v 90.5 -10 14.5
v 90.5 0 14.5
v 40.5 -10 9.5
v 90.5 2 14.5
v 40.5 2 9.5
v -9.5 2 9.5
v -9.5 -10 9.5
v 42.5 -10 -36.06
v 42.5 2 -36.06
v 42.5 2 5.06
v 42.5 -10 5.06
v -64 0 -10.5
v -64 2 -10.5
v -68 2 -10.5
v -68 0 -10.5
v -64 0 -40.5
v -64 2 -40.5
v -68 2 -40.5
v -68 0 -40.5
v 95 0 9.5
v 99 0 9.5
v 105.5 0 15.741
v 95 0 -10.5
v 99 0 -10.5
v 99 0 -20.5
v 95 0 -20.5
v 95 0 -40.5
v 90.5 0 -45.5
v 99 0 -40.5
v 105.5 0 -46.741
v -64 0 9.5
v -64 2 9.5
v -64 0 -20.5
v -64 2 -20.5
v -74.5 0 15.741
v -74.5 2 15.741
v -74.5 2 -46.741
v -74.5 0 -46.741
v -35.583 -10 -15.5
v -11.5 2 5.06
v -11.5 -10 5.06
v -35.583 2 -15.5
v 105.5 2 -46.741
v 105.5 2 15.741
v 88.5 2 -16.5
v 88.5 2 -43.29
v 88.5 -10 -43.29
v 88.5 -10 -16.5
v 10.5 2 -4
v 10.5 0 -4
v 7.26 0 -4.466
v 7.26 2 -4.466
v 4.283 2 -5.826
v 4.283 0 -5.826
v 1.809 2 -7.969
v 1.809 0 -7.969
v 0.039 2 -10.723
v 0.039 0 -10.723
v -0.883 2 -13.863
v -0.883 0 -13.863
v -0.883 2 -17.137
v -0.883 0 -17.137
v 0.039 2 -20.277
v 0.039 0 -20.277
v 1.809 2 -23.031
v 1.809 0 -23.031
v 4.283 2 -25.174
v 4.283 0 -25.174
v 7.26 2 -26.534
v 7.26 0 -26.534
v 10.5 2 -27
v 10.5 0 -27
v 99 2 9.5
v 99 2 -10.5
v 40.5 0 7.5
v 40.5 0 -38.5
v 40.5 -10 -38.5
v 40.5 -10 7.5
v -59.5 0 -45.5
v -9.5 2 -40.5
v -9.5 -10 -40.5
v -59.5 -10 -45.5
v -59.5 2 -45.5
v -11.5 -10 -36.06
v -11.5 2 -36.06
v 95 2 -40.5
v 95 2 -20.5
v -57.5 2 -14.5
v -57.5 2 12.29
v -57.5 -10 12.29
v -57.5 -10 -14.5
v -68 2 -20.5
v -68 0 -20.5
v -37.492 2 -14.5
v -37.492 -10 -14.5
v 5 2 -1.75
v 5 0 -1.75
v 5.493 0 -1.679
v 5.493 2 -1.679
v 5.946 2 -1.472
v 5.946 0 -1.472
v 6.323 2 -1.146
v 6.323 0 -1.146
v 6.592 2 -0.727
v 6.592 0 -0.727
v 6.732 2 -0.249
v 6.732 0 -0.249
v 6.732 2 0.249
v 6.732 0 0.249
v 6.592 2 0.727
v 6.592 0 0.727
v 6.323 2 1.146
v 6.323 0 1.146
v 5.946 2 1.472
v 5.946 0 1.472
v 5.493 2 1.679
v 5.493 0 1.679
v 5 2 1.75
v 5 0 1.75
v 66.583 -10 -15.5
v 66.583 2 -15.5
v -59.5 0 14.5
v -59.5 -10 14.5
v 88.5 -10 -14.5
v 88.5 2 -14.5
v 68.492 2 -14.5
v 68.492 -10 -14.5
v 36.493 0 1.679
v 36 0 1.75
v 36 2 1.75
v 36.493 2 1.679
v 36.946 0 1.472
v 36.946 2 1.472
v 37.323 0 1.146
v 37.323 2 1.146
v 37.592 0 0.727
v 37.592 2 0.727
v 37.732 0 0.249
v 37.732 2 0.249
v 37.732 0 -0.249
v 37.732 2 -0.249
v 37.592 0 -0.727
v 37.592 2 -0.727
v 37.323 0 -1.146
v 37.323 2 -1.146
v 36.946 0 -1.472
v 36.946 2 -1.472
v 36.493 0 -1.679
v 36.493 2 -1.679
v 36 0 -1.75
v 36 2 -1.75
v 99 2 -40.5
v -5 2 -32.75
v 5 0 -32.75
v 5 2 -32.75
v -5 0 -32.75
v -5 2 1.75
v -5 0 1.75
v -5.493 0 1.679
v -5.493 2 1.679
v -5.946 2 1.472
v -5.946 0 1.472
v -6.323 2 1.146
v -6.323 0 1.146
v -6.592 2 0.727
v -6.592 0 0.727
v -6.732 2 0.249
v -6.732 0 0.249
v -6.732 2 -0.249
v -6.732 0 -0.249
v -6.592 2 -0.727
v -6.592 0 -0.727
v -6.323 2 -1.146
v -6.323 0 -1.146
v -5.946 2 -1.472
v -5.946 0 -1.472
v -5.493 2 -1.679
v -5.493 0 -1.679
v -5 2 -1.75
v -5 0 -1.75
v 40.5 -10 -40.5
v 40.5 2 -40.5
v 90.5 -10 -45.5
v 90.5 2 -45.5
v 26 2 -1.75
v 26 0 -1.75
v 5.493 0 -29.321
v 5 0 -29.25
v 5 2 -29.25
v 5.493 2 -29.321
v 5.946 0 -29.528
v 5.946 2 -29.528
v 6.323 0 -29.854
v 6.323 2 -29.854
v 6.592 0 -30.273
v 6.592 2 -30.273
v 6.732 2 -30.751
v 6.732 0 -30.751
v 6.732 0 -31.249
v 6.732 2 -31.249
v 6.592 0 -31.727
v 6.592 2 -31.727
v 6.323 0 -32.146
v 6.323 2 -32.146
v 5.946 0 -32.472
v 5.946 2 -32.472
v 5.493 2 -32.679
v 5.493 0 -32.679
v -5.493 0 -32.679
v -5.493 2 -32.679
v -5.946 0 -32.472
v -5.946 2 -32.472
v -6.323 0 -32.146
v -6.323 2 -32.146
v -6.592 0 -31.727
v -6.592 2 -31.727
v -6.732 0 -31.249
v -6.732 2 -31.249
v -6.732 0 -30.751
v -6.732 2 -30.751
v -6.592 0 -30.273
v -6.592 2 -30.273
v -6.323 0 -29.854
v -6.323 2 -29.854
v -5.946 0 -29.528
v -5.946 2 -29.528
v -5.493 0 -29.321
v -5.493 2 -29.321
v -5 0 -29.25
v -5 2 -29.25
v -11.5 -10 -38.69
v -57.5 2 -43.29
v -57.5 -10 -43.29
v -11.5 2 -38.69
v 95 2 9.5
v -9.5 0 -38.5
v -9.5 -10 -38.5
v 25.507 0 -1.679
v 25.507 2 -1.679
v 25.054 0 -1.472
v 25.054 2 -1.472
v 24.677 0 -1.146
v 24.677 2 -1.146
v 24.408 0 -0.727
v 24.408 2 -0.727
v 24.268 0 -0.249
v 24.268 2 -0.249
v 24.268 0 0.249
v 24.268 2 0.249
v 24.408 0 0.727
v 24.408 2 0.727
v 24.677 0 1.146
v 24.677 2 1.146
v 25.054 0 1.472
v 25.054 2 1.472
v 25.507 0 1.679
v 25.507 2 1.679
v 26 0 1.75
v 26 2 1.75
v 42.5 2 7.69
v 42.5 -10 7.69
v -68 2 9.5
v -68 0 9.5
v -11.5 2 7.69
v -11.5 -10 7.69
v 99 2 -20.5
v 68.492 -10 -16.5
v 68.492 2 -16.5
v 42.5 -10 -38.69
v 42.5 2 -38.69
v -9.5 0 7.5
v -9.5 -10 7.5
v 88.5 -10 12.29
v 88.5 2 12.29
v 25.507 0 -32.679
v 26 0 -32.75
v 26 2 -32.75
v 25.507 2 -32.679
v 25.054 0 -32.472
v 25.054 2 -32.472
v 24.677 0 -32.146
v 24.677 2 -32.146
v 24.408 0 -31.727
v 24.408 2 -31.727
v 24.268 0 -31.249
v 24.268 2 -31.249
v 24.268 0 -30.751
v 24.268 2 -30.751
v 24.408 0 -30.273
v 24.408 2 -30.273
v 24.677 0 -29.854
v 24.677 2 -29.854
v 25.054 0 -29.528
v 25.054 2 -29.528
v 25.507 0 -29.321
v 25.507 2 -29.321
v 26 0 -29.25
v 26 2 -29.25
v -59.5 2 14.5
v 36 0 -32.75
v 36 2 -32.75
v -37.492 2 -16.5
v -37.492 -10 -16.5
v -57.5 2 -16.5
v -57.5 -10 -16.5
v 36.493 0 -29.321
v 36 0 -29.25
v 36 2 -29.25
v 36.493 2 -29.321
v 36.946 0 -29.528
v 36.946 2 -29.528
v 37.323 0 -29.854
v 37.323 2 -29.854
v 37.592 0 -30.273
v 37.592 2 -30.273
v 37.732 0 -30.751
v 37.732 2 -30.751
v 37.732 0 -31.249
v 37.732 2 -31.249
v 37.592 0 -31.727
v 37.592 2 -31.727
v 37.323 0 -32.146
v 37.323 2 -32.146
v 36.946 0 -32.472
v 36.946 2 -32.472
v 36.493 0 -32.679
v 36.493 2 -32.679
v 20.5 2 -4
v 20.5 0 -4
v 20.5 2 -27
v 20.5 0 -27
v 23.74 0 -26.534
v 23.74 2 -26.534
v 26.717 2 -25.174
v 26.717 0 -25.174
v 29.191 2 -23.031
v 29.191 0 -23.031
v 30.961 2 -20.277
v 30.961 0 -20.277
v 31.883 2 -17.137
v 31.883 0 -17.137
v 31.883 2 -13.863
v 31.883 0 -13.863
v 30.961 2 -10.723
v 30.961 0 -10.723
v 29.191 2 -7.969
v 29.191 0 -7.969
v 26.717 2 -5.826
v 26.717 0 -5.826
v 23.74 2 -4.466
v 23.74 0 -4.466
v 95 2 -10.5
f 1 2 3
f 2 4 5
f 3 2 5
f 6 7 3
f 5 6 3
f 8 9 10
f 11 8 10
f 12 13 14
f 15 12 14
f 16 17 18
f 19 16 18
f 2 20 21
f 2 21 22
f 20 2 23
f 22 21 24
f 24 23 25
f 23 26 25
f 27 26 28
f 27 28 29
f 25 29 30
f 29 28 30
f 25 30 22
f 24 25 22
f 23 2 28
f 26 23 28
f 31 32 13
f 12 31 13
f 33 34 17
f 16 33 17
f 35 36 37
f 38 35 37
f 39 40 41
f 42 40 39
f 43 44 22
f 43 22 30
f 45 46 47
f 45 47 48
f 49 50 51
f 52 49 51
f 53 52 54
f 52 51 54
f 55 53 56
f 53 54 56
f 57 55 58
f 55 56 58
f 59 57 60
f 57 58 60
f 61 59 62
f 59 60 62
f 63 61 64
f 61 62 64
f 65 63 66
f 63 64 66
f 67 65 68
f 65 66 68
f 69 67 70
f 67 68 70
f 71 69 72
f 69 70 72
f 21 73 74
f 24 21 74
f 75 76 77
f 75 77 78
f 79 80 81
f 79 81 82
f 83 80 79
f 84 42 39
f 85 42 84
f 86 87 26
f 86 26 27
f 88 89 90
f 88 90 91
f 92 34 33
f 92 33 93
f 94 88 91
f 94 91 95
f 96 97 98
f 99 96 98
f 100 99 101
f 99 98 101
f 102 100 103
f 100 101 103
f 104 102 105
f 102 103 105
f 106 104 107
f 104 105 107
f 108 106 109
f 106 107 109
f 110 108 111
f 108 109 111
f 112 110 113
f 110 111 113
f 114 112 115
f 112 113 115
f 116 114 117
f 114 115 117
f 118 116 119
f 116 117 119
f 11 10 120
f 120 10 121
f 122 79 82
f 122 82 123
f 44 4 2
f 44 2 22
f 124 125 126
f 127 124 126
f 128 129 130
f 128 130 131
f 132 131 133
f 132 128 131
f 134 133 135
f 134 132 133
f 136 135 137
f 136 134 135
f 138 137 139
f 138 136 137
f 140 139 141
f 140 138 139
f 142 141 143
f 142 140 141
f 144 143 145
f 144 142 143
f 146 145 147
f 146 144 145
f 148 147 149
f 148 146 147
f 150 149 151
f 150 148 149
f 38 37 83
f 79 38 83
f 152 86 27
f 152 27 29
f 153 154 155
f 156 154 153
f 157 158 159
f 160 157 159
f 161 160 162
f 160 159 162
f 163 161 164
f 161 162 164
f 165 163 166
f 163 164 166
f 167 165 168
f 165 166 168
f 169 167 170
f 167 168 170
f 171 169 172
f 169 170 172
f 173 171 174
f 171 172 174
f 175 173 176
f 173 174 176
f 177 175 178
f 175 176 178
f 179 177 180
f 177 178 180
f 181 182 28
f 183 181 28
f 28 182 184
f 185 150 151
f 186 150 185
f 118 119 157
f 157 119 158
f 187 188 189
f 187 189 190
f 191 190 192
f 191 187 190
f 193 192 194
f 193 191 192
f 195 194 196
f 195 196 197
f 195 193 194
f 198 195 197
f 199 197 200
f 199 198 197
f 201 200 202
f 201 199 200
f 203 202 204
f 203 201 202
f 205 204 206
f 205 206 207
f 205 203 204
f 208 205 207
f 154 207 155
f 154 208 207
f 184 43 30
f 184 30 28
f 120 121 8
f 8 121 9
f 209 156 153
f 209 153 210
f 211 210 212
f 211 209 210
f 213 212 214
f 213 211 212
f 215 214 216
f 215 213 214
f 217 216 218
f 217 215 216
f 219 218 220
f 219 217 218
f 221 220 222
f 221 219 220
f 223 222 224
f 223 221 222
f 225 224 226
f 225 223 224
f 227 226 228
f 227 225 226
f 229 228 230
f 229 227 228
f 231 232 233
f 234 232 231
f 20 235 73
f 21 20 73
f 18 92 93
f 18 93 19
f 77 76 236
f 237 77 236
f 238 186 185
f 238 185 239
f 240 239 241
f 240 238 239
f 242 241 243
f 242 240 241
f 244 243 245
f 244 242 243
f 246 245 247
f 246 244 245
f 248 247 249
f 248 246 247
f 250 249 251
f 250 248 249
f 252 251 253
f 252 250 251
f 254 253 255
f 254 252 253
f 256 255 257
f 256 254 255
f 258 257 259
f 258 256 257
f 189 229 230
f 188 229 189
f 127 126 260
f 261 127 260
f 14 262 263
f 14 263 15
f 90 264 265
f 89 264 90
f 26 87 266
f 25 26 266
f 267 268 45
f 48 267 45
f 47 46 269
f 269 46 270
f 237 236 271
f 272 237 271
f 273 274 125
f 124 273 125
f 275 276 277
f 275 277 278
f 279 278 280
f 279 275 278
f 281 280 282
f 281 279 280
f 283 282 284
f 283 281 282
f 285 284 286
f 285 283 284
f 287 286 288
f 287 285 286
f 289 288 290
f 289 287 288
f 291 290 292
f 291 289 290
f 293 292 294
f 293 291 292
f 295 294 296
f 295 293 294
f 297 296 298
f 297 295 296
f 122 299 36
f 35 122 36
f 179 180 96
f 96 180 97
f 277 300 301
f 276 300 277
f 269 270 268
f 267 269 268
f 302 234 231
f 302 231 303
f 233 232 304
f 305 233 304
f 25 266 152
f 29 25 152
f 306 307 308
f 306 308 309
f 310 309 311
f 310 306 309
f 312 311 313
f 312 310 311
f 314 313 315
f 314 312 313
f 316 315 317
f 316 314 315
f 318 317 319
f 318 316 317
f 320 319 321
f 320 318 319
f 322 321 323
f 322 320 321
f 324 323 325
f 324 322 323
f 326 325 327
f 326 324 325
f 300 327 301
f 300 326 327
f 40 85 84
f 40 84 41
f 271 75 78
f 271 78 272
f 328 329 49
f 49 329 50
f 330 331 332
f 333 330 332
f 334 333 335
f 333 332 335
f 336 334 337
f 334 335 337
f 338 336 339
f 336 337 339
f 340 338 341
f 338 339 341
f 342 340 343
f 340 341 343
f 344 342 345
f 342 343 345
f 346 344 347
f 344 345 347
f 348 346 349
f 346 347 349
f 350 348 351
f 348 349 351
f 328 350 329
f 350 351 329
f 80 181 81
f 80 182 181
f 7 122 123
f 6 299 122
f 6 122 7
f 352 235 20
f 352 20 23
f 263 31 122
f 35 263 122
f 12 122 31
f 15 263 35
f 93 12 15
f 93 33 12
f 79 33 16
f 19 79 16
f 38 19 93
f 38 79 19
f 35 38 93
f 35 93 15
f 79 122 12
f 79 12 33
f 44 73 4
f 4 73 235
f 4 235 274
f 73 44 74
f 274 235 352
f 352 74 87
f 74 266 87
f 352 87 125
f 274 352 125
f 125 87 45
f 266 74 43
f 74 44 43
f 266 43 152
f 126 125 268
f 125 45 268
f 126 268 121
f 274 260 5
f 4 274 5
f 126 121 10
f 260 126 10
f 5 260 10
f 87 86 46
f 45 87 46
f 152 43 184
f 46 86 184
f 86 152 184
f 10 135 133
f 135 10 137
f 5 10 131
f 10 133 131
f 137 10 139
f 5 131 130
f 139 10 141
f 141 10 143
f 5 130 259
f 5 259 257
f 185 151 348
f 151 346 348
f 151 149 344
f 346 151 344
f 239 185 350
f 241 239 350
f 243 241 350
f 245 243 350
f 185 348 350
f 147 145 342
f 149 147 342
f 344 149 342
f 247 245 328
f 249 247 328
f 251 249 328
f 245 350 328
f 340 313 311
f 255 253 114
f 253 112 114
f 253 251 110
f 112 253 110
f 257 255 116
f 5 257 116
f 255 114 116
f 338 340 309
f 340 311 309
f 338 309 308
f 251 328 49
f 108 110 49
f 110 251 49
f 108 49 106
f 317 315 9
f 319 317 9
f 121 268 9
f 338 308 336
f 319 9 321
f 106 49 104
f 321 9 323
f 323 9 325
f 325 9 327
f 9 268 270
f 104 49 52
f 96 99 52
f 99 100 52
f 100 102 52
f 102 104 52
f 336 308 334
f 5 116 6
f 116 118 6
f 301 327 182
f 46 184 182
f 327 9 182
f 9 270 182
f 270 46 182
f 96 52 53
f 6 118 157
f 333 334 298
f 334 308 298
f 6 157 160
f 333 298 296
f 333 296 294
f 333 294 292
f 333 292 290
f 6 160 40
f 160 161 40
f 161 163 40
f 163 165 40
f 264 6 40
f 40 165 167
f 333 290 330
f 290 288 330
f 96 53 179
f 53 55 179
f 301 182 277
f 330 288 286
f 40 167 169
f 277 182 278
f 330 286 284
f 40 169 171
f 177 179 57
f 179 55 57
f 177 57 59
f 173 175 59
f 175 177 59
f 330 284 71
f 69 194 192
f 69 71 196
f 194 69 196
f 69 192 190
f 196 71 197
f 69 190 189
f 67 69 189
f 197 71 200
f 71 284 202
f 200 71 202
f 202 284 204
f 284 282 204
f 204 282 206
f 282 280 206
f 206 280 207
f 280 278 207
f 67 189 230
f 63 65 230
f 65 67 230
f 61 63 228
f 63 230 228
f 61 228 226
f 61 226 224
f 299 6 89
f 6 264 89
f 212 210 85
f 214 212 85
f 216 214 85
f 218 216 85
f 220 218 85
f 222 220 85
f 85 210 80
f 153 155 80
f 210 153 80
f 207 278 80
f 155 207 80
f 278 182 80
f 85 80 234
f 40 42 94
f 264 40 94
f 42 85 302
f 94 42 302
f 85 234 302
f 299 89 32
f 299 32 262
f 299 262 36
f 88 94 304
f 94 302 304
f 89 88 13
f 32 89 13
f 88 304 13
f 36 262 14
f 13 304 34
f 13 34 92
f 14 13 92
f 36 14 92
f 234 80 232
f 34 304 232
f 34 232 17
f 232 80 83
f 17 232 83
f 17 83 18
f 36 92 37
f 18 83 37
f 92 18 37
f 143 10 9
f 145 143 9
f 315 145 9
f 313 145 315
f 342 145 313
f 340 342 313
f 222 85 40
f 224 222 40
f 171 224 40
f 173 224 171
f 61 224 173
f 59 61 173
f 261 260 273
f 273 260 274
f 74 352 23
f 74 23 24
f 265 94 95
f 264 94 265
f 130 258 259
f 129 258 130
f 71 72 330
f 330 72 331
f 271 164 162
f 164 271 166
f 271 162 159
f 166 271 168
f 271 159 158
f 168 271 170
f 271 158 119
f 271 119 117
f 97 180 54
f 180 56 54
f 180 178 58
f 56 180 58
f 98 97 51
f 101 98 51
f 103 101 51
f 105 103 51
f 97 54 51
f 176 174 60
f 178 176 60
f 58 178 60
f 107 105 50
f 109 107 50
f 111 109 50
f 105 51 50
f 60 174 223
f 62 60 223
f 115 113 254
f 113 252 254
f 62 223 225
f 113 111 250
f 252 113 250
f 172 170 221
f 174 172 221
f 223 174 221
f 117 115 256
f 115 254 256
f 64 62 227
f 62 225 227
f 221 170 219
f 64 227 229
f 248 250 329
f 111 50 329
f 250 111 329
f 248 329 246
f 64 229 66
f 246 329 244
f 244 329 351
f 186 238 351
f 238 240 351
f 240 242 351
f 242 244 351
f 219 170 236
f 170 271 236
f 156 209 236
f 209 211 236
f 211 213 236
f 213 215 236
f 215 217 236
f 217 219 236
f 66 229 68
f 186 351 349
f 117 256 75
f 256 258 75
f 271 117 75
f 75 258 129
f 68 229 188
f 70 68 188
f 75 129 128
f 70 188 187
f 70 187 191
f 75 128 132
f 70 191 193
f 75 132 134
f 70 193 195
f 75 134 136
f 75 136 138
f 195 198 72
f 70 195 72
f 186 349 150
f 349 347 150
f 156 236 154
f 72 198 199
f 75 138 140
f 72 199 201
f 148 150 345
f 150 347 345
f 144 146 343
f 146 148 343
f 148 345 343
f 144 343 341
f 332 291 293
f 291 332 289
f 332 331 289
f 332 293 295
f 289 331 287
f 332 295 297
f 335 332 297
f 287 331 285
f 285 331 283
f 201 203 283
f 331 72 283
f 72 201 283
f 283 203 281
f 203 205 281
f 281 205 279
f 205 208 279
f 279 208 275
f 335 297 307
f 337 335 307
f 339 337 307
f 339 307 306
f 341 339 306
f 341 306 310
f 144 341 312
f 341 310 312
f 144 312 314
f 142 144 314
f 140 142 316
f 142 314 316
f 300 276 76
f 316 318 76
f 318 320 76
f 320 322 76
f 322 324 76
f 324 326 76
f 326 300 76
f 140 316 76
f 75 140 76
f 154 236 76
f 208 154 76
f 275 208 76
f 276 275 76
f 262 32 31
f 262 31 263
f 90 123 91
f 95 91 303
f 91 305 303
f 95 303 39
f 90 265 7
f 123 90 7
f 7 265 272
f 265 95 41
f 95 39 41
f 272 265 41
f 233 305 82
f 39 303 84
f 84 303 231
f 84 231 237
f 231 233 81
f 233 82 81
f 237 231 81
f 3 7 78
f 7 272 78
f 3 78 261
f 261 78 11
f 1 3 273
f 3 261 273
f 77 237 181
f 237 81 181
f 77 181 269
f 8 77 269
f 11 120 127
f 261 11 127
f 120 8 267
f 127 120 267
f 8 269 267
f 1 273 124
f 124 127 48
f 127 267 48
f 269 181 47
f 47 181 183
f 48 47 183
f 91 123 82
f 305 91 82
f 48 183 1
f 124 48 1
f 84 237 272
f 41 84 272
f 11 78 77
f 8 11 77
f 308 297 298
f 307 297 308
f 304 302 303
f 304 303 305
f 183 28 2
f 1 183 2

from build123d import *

# Parameters (mm, degrees)
SKETCH1_W           = 170
SKETCH1_H           = 50
BOSS_EXTRUDE1_DEPTH = 2
SKETCH2_W           = 2
SKETCH2_H           = 50
BOSS_EXTRUDE2_DEPTH = 10
SKETCH3_W           = 150
SKETCH3_H           = 2
BOSS_EXTRUDE3_DEPTH = 10
SKETCH4_W           = 60
SKETCH4_H           = 50
CUT_EXTRUDE2_DEPTH  = 13
BOSS_EXTRUDE5_DEPTH = 12
BOSS_EXTRUDE7_DEPTH = 2
SKETCH8_W           = 4
SKETCH8_H           = 20
CUT_EXTRUDE3_DEPTH  = 2


with BuildPart() as part:
    # Sketch1 → Boss-Extrude1 (new body)
    with BuildSketch(Plane(origin=(0, 0, 0), x_dir=(1, 0, 0), z_dir=(0, 1, 0))):
        with Locations((15.5, 15.5)):
            Rectangle(SKETCH1_W, SKETCH1_H)
        with BuildLine():
            Line((5, 32.75), (-5, 32.75))
            ThreePointArc((-5, 32.75), (-6.75, 31), (-5, 29.25))
            Line((-5, 29.25), (5, 29.25))
            ThreePointArc((5, 29.25), (6.749999891, 31), (5, 32.75))
        make_face(mode=Mode.SUBTRACT)
        with BuildLine():
            Line((26, 29.25), (36, 29.25))
            ThreePointArc((36, 29.25), (37.75, 31), (36, 32.75))
            Line((36, 32.75), (26, 32.75))
            ThreePointArc((26, 32.75), (24.25, 31), (26, 29.25))
        make_face(mode=Mode.SUBTRACT)
        with BuildLine():
            Line((-5, 1.75), (5, 1.75))
            ThreePointArc((5, 1.75), (6.75, 0), (5, -1.75))
            Line((5, -1.75), (-5, -1.75))
            ThreePointArc((-5, -1.75), (-6.75, 0), (-5, 1.75))
        make_face(mode=Mode.SUBTRACT)
        with BuildLine():
            Line((26, -1.75), (36, -1.75))
            ThreePointArc((36, -1.75), (37.75, 0), (36, 1.75))
            Line((36, 1.75), (26, 1.75))
            ThreePointArc((26, 1.75), (24.25, 0), (26, -1.75))
        make_face(mode=Mode.SUBTRACT)
        with BuildLine():
            Line((10.5, 27), (20.5, 27))
            ThreePointArc((20.5, 27), (32, 15.5), (20.5, 4))
            Line((20.5, 4), (10.5, 4))
            ThreePointArc((10.5, 4), (-1, 15.5), (10.5, 27))
        make_face(mode=Mode.SUBTRACT)
    extrude(amount=BOSS_EXTRUDE1_DEPTH)

    # Sketch2 → Boss-Extrude2 (add)
    with BuildSketch(Plane(origin=(0, 0, 0), x_dir=(-1, 0, 0), z_dir=(0, -1, 0))):
        with Locations((60.5, 15.5)):
            Rectangle(SKETCH2_W, SKETCH2_H)
        with Locations((-91.5, 15.5)):
            Rectangle(SKETCH2_W, SKETCH2_H)
    extrude(amount=BOSS_EXTRUDE2_DEPTH)

    # Sketch3 → Boss-Extrude3 (add)
    with BuildSketch(Plane(origin=(0, 0, 0), x_dir=(-1, 0, 0), z_dir=(0, -1, 0))):
        with Locations((-15.5, 39.5)):
            Rectangle(SKETCH3_W, SKETCH3_H)
        with Locations((-15.5, -8.5)):
            Rectangle(SKETCH3_W, SKETCH3_H)
    extrude(amount=BOSS_EXTRUDE3_DEPTH)

    # Sketch4 → Cut-Extrude2 (cut, through all)
    with BuildSketch(Plane(origin=(0, 2, 0), x_dir=(1, 0, 0), z_dir=(0, 1, 0))):
        with Locations((-39.5, 15.5)):
            Rectangle(SKETCH4_W, SKETCH4_H)
    cut_extrude2 = extrude(amount=-CUT_EXTRUDE2_DEPTH, mode=Mode.SUBTRACT)

    # Mirror1: Cut-Extrude2 across plane
    add(cut_extrude2.mirror(Plane.ZY.offset(-15.5)), mode=Mode.SUBTRACT)

    # Sketch5 → Boss-Extrude5 (add)
    with BuildSketch(Plane(origin=(0, 2, 0), x_dir=(1, 0, 0), z_dir=(0, 1, 0))):
        Polygon((40.5, 40.5), (90.5, 45.5), (90.5, -14.5), (40.5, -9.5), (40.5, -7.690024876), (40.5, 38.5), align=None)
        Polygon((42.5, 38.690024876), (68.491666638, 16.5), (88.5, 16.5), (88.5, 18.080254606), (88.5, 43.290024876), align=None, mode=Mode.SUBTRACT)
        Polygon((88.5, 14.5), (68.491666638, 14.5), (42.5, -7.690024876), (88.5, -12.290024876), align=None, mode=Mode.SUBTRACT)
        Polygon((66.582731952, 15.5), (42.5, 36.060298366), (42.5, -5.060298366), align=None, mode=Mode.SUBTRACT)
    boss_extrude5 = extrude(amount=-BOSS_EXTRUDE5_DEPTH)

    # Sketch7 → Boss-Extrude7 (add)
    with BuildSketch(Plane(origin=(0, 2, 0), x_dir=(1, 0, 0), z_dir=(0, 1, 0))):
        Polygon((90.5, -14.5), (105.5, -15.740832862), (105.5, 46.740832862), (90.5, 45.5), align=None)
    boss_extrude7 = extrude(amount=-BOSS_EXTRUDE7_DEPTH)

    # Sketch8 → Cut-Extrude3 (cut)
    with BuildSketch(Plane(origin=(0, 2, 0), x_dir=(1, 0, 0), z_dir=(0, 1, 0))):
        with Locations((97, 0.5)):
            Rectangle(SKETCH8_W, SKETCH8_H)
        with Locations((97, 30.5)):
            Rectangle(SKETCH8_W, SKETCH8_H)
    cut_extrude3 = extrude(amount=-CUT_EXTRUDE3_DEPTH, mode=Mode.SUBTRACT)

    # Mirror2: Boss-Extrude5, Boss-Extrude7, Cut-Extrude3 across plane
    add(boss_extrude5.mirror(Plane.ZY.offset(-15.5)))
    add(boss_extrude7.mirror(Plane.ZY.offset(-15.5)))
    add(cut_extrude3.mirror(Plane.ZY.offset(-15.5)), mode=Mode.SUBTRACT)


solid = part.part
